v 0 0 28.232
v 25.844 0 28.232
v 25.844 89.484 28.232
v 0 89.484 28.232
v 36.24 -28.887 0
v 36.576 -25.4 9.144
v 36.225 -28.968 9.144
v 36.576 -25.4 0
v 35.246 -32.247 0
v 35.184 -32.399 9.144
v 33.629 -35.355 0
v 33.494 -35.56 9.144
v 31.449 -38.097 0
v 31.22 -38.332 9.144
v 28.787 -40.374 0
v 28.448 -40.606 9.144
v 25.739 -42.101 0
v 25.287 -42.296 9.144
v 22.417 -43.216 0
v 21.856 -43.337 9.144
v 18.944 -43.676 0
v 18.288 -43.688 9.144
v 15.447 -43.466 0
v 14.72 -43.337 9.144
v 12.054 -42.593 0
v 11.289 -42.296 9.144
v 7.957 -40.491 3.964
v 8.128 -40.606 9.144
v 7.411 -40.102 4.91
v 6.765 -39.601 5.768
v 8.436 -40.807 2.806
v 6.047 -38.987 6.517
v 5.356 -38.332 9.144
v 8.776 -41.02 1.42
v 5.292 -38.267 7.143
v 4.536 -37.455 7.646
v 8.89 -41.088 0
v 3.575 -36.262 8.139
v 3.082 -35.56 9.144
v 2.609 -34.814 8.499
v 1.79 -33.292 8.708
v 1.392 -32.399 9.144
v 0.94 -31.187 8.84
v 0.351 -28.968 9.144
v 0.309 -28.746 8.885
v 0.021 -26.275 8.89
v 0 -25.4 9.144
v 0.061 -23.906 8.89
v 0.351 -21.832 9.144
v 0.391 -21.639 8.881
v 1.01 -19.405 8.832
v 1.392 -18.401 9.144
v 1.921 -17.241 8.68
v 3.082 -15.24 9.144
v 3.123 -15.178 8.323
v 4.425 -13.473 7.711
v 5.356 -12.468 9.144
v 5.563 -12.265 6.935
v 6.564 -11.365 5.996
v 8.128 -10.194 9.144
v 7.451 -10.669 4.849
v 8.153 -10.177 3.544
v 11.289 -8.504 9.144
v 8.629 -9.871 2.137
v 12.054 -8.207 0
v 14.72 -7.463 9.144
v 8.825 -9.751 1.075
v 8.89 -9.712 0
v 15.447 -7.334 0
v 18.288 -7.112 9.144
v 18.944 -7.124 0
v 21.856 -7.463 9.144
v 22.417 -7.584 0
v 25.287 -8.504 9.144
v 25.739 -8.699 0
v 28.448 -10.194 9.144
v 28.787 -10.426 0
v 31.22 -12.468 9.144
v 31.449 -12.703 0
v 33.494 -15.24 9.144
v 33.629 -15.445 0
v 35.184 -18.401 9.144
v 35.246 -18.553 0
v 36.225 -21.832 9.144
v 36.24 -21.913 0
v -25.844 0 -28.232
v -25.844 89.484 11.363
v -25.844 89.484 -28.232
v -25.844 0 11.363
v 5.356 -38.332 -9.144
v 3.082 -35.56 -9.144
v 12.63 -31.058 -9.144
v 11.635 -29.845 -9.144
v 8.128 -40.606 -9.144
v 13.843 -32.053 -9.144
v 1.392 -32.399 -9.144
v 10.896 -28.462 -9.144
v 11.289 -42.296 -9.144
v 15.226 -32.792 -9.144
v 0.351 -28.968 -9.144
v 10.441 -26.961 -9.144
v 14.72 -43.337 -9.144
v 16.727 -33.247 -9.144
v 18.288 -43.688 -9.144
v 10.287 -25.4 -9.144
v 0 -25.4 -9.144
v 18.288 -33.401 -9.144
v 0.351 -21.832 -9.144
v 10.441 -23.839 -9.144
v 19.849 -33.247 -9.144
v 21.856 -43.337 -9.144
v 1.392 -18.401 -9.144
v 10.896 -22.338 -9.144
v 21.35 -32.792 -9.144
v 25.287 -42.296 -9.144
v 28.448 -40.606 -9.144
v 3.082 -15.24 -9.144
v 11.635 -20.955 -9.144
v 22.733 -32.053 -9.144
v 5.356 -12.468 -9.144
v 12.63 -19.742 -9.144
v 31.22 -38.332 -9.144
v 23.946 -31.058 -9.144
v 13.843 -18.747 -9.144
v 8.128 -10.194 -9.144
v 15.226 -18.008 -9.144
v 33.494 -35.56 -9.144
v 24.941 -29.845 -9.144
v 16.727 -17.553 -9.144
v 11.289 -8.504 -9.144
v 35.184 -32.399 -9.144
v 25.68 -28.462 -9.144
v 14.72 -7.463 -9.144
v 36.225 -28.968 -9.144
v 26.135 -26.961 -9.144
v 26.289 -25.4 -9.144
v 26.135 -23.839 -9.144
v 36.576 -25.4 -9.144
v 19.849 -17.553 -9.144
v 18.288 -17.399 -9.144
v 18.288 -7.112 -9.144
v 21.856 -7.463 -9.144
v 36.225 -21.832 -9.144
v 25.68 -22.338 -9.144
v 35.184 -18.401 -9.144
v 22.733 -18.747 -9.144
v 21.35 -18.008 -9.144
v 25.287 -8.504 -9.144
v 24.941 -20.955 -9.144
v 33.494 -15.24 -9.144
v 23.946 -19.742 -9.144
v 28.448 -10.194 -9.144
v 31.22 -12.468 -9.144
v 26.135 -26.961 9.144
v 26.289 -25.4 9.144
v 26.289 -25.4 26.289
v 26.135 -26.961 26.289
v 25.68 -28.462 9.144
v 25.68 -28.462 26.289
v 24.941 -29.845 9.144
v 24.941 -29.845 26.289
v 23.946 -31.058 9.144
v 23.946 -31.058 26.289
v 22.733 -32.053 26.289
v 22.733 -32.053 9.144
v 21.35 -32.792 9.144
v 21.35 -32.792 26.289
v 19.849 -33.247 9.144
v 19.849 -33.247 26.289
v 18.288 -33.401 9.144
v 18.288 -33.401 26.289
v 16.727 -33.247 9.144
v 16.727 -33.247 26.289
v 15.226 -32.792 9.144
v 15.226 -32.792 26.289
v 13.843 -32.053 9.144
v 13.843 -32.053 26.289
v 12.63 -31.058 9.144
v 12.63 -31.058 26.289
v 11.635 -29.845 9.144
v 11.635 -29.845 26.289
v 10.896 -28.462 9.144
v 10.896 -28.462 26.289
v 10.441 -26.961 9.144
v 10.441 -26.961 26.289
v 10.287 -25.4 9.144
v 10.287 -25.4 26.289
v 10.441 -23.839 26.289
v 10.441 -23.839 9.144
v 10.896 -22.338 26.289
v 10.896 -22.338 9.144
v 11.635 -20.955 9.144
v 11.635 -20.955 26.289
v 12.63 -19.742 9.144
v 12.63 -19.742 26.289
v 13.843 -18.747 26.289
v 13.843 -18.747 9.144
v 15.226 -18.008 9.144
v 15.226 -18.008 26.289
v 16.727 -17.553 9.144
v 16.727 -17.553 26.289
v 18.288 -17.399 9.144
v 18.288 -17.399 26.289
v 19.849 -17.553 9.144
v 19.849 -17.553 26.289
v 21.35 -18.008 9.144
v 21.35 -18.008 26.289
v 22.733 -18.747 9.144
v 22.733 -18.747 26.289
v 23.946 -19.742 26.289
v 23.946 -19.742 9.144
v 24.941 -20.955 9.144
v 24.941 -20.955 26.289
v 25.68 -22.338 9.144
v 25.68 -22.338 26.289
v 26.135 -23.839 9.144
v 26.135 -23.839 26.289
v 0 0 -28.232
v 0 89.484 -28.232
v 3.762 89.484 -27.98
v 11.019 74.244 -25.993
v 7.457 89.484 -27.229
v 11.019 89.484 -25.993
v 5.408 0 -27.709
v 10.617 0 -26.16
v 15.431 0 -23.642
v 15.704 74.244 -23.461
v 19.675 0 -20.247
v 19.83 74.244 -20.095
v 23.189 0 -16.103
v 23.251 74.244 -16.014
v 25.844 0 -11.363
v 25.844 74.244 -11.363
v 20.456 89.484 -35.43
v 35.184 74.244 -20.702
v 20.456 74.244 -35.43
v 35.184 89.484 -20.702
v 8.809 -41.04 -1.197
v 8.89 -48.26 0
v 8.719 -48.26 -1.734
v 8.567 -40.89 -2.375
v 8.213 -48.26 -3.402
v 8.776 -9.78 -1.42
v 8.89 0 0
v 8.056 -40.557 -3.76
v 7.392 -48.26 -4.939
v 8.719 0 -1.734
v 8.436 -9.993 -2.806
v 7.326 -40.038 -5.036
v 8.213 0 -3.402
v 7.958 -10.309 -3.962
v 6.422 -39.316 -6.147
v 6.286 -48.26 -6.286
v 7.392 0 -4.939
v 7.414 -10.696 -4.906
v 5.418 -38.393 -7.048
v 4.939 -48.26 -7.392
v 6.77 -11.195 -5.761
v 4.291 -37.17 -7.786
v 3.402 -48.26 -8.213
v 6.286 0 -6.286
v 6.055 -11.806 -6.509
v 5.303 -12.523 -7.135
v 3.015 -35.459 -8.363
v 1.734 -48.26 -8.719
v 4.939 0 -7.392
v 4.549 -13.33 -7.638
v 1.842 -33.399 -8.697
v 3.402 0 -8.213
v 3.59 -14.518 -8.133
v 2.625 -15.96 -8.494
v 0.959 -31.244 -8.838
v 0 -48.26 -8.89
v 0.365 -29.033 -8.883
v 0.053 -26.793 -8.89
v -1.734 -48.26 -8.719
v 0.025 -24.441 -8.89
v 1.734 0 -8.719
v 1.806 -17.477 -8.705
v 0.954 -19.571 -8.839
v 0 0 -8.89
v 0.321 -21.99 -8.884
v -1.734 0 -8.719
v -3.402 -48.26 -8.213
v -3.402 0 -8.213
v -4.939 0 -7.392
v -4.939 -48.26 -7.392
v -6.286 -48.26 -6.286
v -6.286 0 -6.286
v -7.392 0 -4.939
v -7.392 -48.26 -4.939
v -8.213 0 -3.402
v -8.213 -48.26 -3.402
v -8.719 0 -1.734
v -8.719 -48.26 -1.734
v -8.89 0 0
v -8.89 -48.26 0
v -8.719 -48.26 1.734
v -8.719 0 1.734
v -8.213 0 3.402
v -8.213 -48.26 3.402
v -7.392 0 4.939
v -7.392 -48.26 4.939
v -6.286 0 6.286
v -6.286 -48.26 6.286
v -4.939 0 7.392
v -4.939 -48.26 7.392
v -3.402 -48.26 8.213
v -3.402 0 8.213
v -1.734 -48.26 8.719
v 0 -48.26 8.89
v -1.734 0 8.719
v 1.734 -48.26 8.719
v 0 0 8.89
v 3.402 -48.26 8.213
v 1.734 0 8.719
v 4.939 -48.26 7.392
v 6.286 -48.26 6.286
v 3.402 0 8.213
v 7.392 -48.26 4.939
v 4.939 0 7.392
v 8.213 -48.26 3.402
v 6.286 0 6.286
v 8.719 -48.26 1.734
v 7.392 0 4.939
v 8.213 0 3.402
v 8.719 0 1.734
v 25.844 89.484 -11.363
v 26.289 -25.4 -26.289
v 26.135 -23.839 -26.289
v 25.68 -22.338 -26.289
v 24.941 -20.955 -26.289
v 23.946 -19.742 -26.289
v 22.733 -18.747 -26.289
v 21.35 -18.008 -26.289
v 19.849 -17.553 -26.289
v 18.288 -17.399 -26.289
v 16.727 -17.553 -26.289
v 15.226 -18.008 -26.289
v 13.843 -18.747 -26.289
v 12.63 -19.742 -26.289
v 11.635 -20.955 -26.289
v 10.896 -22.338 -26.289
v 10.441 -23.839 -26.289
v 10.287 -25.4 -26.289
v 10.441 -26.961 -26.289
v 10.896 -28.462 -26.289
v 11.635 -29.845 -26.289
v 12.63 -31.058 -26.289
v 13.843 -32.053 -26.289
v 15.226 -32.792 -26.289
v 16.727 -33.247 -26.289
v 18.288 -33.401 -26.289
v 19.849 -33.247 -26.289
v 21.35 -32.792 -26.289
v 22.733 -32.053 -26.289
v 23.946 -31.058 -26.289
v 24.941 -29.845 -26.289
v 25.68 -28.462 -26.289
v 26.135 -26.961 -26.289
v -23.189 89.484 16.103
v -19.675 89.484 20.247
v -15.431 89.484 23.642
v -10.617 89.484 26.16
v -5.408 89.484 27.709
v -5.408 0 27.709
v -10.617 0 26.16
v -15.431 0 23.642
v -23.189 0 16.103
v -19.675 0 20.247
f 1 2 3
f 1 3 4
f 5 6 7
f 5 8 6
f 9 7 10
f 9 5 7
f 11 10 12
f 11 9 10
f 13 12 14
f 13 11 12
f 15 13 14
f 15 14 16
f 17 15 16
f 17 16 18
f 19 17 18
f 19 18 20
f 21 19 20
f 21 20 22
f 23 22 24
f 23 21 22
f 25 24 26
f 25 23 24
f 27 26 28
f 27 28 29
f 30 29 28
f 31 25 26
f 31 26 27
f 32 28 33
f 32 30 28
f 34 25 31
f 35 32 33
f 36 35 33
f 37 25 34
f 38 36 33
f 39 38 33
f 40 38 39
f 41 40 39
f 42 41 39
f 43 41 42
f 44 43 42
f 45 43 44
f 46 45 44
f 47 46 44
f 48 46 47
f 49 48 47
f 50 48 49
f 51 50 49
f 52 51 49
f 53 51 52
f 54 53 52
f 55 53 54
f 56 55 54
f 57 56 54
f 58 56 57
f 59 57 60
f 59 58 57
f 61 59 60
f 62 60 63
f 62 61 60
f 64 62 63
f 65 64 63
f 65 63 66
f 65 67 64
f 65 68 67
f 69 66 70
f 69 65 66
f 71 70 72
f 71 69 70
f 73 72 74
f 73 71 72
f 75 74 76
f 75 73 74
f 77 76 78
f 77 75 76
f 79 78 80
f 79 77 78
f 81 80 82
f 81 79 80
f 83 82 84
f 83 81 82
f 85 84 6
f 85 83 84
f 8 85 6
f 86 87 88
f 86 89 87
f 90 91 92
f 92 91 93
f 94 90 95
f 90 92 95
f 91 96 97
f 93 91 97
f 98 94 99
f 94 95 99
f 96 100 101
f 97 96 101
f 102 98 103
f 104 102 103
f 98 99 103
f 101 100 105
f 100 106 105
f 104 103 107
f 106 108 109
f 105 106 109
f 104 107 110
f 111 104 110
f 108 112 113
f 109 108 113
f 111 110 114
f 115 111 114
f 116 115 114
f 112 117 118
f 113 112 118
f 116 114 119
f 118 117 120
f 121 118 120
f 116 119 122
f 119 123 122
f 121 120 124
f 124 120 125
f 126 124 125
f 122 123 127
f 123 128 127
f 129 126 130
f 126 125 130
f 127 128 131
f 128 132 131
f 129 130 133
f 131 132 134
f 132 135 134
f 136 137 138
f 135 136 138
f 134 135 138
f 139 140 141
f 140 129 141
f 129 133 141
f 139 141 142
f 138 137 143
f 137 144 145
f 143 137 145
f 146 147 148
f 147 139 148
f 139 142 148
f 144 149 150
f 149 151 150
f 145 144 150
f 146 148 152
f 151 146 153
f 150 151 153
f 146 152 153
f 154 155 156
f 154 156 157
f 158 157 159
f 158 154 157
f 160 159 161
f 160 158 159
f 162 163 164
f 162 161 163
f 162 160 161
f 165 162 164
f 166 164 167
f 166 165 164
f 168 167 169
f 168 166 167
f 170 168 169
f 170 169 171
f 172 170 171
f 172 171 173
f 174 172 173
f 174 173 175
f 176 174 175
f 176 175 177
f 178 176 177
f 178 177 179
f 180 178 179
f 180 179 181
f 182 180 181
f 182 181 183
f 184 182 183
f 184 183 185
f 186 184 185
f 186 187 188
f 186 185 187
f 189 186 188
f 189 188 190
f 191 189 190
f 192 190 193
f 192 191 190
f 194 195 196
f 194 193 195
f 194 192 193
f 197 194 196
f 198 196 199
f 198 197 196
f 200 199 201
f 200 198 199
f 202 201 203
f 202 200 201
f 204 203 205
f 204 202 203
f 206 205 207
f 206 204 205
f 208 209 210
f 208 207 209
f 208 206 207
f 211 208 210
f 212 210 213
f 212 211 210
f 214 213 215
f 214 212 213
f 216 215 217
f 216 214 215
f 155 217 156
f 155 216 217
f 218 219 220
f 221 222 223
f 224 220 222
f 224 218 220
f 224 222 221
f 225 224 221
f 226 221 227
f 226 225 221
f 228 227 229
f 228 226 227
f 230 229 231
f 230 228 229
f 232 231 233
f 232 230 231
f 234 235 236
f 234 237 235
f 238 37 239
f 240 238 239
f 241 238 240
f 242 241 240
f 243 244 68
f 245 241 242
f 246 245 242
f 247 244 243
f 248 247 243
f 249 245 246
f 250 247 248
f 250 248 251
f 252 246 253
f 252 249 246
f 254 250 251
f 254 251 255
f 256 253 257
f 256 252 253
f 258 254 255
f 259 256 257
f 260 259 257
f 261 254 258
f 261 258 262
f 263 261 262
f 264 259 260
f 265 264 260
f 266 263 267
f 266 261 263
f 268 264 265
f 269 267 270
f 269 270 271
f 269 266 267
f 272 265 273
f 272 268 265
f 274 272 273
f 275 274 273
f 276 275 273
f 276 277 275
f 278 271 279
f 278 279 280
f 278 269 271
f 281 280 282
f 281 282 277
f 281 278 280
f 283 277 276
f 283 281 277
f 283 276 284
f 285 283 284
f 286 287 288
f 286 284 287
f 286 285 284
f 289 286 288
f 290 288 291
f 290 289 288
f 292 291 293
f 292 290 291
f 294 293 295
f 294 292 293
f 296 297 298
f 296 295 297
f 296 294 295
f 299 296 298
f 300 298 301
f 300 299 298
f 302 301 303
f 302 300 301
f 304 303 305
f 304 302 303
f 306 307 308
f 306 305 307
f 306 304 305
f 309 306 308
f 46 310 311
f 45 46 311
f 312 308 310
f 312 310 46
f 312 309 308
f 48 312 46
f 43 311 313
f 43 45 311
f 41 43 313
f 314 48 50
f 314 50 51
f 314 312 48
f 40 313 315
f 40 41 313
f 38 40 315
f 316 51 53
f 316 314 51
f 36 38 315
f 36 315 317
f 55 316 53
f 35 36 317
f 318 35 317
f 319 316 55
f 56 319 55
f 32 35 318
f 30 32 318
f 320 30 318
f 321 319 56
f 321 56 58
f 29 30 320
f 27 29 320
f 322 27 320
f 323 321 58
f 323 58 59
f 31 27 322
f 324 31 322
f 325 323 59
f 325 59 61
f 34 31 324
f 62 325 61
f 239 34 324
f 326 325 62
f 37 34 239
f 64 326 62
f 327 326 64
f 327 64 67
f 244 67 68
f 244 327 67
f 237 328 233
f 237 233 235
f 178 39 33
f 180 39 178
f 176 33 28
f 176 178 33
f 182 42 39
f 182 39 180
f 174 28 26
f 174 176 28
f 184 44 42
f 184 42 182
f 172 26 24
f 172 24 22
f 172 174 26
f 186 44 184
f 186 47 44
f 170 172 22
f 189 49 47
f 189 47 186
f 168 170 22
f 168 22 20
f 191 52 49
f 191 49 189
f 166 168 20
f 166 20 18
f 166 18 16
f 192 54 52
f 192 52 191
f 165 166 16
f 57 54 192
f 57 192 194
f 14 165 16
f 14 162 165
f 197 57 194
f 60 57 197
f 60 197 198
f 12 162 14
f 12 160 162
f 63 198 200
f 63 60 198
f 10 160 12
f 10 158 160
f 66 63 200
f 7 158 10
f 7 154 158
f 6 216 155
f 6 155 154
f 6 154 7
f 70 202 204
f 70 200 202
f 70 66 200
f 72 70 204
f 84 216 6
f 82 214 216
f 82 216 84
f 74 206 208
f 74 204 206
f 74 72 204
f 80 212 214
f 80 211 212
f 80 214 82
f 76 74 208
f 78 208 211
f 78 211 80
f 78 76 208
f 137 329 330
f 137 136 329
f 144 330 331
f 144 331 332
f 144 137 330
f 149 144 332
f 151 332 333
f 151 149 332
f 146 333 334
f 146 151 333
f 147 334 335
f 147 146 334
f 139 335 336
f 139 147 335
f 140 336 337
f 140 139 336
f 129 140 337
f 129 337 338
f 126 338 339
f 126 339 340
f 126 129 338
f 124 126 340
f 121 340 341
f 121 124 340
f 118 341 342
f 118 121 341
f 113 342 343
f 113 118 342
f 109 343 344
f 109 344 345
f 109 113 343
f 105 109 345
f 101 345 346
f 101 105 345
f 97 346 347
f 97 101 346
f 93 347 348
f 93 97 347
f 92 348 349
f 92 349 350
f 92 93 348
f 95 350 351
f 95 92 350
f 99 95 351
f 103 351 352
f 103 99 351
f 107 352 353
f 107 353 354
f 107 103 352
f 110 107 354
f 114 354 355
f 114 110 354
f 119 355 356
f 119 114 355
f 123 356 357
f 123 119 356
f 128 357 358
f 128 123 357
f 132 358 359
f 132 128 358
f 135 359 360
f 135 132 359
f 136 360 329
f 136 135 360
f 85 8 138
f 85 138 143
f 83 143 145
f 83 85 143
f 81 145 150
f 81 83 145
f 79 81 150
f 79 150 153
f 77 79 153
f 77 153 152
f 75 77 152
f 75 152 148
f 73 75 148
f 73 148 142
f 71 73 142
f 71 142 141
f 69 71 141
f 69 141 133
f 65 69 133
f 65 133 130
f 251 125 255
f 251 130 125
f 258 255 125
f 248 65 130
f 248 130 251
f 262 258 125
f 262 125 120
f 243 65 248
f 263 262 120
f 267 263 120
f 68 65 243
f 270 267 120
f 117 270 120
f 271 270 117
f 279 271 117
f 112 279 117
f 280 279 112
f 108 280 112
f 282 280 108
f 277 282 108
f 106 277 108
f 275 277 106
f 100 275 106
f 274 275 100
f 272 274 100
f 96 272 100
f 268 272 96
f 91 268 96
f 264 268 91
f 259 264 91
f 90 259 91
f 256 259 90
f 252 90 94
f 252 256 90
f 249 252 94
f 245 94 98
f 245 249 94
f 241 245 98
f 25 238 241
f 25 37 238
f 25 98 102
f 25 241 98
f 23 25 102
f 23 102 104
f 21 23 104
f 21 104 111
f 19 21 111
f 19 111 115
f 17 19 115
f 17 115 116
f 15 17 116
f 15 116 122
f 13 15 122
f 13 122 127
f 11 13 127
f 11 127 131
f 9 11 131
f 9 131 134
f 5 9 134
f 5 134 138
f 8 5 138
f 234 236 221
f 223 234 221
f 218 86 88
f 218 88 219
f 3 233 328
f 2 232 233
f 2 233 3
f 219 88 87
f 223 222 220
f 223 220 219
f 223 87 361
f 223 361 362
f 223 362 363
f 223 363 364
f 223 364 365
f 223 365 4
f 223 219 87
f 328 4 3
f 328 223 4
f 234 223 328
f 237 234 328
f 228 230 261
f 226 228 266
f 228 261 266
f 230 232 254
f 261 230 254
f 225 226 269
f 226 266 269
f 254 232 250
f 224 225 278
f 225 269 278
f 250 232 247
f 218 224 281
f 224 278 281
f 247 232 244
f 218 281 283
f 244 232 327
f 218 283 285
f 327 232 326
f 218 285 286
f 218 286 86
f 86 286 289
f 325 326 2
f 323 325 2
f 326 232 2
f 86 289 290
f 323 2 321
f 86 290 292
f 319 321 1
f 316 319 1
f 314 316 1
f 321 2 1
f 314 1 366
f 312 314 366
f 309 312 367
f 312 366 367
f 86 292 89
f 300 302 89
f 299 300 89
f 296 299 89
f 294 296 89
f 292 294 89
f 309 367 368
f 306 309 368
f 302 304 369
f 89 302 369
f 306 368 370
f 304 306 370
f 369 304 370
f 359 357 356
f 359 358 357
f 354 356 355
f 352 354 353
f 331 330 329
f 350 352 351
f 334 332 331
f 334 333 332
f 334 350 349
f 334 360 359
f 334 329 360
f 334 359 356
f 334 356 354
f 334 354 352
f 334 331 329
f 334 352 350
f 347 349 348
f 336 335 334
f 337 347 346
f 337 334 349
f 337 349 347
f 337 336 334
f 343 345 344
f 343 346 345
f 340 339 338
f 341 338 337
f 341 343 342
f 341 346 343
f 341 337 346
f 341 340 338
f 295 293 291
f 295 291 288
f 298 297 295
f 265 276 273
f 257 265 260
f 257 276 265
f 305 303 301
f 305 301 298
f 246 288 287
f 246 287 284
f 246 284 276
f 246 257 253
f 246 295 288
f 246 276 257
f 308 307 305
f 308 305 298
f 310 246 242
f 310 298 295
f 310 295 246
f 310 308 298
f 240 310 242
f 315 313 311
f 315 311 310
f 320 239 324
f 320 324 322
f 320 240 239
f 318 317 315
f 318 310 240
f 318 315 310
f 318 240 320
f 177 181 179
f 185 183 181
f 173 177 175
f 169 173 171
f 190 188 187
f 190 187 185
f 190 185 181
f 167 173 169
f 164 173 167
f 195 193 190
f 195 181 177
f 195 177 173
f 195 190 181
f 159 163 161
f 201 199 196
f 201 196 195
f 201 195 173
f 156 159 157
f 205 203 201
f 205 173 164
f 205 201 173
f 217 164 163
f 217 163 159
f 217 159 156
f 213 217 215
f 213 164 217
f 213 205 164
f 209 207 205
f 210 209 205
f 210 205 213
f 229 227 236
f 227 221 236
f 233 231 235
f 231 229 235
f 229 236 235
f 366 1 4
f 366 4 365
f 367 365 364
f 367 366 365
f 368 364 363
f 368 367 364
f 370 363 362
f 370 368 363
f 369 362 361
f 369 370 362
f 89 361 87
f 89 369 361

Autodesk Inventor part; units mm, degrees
ref_plane "YZ Plane" through (0, 0, 0) normal (1, 0, 0) x (0, 1, 0)
ref_plane "XZ Plane" through (0, 0, 0) normal (0, 1, 0) x (-1, 0, 0)
ref_plane "XY Plane" through (0, 0, 0) normal (0, 0, 1) x (1, 0, 0)
sketch "Sketch1" plane through (0, 0, 0) normal (0, 1, 0) x (-1, 0, 0)
  line L0 (-25.8445, -28.2321) -> (25.8445, -28.2321) construction
  line L1 (25.8445, -28.2321) -> (25.8445, 28.2321) construction
  line L2 (25.8445, 28.2321) -> (-25.8445, 28.2321) construction
  line L3 (-25.8445, 28.2321) -> (-25.8445, -28.2321) construction
  line L4 (-25.8445, -28.2321) -> (25.8445, 28.2321) construction
  line L5 (25.8445, -28.2321) -> (-25.8445, 28.2321) construction
  circle A0 centre (0, 0) radius 28.2321 construction
  arc A1 (-25.8445, -11.3628) -> (0, -28.2321) centre (0, 0) ccw
  arc A2 (25.8445, 11.3628) -> (0, 28.2321) centre (0, 0) ccw
  line L6 (25.8445, 11.3628) -> (25.8445, -28.2321)
  line L7 (25.8445, -28.2321) -> (0, -28.2321)
  line L8 (-25.8445, -11.3628) -> (-25.8445, 28.2321)
  line L9 (-25.8445, 28.2321) -> (0, 28.2321)
  dimension "d2" = 51.689
  dimension "d3" = 56.4642
extrude "Extrusion1" add sketch "Sketch1" along normal blind 89.4842
sketch "Sketch2" plane through (0, 0, 0) normal (0, -1, 0) x (1, 0, 0)
  circle A0 centre (0, 0) radius 8.89
  dimension "d6" = 17.78
extrude "Extrusion2" add sketch "Sketch2" along normal blind 48.26
sketch "Sketch3" plane through (0, 0, 0) normal (0, 0, 1) x (1, 0, 0)
  line L0 (-8.89, -48.26) -> (8.89, -48.26) projected
  line L1 (8.89, 0) -> (-8.89, 0) projected
  line L2 (0, -48.26) -> (0, -25.4) construction
  line L3 (0, -25.4) -> (18.288, -25.4) construction
  circle A0 centre (18.288, -25.4) radius 18.288
  dimension "d9" = 22.86
  dimension "d10" = 18.288
extrude "Extrusion3" add sketch "Sketch3" along normal blind 9.144 and the other way blind 9.144
sketch "Sketch4" plane through (18.288, -25.4, 9.144) normal (0, 0, 1) x (1, 0, 0)
  circle A0 centre (0, 0) radius 8.001
  dimension "d15" = 16.002
extrude "Extrusion4" add sketch "Sketch4" along normal blind 17.145
mirror "Mirror1" about plane through (0, 0, 0) normal (0, 0, 1) of "Extrusion4"
sketch "Sketch5" plane through (0, 89.4842, 0) normal (0, 1, 0) x (1, 0, 0)
  arc A0 (25.8445, 11.3628) -> (0, 28.2321) centre (0, 0) ccw construction
  line L0 (25.8445, -28.2321) -> (25.8445, 11.3628) construction
  line L1 (25.8445, 11.3628) -> (35.184, 20.7023)
  line L2 (25.8445, 11.3628) -> (39.0525, 11.3628) construction
  line L3 (35.184, 20.7023) -> (20.4563, 35.4299)
  line L4 (20.4563, 35.4299) -> (11.0193, 25.9928)
  arc A1 (25.8445, 11.3628) -> (11.0193, 25.9928) centre (0, 0) ccw
  dimension "d18" = 13.208
  dimension "d19" = 45
  dimension "d20" = 20.828
extrude "Extrusion5" add sketch "Sketch5" against normal blind 15.24
properties part number "Motor_500RPM" material "Aluminum 6061"
